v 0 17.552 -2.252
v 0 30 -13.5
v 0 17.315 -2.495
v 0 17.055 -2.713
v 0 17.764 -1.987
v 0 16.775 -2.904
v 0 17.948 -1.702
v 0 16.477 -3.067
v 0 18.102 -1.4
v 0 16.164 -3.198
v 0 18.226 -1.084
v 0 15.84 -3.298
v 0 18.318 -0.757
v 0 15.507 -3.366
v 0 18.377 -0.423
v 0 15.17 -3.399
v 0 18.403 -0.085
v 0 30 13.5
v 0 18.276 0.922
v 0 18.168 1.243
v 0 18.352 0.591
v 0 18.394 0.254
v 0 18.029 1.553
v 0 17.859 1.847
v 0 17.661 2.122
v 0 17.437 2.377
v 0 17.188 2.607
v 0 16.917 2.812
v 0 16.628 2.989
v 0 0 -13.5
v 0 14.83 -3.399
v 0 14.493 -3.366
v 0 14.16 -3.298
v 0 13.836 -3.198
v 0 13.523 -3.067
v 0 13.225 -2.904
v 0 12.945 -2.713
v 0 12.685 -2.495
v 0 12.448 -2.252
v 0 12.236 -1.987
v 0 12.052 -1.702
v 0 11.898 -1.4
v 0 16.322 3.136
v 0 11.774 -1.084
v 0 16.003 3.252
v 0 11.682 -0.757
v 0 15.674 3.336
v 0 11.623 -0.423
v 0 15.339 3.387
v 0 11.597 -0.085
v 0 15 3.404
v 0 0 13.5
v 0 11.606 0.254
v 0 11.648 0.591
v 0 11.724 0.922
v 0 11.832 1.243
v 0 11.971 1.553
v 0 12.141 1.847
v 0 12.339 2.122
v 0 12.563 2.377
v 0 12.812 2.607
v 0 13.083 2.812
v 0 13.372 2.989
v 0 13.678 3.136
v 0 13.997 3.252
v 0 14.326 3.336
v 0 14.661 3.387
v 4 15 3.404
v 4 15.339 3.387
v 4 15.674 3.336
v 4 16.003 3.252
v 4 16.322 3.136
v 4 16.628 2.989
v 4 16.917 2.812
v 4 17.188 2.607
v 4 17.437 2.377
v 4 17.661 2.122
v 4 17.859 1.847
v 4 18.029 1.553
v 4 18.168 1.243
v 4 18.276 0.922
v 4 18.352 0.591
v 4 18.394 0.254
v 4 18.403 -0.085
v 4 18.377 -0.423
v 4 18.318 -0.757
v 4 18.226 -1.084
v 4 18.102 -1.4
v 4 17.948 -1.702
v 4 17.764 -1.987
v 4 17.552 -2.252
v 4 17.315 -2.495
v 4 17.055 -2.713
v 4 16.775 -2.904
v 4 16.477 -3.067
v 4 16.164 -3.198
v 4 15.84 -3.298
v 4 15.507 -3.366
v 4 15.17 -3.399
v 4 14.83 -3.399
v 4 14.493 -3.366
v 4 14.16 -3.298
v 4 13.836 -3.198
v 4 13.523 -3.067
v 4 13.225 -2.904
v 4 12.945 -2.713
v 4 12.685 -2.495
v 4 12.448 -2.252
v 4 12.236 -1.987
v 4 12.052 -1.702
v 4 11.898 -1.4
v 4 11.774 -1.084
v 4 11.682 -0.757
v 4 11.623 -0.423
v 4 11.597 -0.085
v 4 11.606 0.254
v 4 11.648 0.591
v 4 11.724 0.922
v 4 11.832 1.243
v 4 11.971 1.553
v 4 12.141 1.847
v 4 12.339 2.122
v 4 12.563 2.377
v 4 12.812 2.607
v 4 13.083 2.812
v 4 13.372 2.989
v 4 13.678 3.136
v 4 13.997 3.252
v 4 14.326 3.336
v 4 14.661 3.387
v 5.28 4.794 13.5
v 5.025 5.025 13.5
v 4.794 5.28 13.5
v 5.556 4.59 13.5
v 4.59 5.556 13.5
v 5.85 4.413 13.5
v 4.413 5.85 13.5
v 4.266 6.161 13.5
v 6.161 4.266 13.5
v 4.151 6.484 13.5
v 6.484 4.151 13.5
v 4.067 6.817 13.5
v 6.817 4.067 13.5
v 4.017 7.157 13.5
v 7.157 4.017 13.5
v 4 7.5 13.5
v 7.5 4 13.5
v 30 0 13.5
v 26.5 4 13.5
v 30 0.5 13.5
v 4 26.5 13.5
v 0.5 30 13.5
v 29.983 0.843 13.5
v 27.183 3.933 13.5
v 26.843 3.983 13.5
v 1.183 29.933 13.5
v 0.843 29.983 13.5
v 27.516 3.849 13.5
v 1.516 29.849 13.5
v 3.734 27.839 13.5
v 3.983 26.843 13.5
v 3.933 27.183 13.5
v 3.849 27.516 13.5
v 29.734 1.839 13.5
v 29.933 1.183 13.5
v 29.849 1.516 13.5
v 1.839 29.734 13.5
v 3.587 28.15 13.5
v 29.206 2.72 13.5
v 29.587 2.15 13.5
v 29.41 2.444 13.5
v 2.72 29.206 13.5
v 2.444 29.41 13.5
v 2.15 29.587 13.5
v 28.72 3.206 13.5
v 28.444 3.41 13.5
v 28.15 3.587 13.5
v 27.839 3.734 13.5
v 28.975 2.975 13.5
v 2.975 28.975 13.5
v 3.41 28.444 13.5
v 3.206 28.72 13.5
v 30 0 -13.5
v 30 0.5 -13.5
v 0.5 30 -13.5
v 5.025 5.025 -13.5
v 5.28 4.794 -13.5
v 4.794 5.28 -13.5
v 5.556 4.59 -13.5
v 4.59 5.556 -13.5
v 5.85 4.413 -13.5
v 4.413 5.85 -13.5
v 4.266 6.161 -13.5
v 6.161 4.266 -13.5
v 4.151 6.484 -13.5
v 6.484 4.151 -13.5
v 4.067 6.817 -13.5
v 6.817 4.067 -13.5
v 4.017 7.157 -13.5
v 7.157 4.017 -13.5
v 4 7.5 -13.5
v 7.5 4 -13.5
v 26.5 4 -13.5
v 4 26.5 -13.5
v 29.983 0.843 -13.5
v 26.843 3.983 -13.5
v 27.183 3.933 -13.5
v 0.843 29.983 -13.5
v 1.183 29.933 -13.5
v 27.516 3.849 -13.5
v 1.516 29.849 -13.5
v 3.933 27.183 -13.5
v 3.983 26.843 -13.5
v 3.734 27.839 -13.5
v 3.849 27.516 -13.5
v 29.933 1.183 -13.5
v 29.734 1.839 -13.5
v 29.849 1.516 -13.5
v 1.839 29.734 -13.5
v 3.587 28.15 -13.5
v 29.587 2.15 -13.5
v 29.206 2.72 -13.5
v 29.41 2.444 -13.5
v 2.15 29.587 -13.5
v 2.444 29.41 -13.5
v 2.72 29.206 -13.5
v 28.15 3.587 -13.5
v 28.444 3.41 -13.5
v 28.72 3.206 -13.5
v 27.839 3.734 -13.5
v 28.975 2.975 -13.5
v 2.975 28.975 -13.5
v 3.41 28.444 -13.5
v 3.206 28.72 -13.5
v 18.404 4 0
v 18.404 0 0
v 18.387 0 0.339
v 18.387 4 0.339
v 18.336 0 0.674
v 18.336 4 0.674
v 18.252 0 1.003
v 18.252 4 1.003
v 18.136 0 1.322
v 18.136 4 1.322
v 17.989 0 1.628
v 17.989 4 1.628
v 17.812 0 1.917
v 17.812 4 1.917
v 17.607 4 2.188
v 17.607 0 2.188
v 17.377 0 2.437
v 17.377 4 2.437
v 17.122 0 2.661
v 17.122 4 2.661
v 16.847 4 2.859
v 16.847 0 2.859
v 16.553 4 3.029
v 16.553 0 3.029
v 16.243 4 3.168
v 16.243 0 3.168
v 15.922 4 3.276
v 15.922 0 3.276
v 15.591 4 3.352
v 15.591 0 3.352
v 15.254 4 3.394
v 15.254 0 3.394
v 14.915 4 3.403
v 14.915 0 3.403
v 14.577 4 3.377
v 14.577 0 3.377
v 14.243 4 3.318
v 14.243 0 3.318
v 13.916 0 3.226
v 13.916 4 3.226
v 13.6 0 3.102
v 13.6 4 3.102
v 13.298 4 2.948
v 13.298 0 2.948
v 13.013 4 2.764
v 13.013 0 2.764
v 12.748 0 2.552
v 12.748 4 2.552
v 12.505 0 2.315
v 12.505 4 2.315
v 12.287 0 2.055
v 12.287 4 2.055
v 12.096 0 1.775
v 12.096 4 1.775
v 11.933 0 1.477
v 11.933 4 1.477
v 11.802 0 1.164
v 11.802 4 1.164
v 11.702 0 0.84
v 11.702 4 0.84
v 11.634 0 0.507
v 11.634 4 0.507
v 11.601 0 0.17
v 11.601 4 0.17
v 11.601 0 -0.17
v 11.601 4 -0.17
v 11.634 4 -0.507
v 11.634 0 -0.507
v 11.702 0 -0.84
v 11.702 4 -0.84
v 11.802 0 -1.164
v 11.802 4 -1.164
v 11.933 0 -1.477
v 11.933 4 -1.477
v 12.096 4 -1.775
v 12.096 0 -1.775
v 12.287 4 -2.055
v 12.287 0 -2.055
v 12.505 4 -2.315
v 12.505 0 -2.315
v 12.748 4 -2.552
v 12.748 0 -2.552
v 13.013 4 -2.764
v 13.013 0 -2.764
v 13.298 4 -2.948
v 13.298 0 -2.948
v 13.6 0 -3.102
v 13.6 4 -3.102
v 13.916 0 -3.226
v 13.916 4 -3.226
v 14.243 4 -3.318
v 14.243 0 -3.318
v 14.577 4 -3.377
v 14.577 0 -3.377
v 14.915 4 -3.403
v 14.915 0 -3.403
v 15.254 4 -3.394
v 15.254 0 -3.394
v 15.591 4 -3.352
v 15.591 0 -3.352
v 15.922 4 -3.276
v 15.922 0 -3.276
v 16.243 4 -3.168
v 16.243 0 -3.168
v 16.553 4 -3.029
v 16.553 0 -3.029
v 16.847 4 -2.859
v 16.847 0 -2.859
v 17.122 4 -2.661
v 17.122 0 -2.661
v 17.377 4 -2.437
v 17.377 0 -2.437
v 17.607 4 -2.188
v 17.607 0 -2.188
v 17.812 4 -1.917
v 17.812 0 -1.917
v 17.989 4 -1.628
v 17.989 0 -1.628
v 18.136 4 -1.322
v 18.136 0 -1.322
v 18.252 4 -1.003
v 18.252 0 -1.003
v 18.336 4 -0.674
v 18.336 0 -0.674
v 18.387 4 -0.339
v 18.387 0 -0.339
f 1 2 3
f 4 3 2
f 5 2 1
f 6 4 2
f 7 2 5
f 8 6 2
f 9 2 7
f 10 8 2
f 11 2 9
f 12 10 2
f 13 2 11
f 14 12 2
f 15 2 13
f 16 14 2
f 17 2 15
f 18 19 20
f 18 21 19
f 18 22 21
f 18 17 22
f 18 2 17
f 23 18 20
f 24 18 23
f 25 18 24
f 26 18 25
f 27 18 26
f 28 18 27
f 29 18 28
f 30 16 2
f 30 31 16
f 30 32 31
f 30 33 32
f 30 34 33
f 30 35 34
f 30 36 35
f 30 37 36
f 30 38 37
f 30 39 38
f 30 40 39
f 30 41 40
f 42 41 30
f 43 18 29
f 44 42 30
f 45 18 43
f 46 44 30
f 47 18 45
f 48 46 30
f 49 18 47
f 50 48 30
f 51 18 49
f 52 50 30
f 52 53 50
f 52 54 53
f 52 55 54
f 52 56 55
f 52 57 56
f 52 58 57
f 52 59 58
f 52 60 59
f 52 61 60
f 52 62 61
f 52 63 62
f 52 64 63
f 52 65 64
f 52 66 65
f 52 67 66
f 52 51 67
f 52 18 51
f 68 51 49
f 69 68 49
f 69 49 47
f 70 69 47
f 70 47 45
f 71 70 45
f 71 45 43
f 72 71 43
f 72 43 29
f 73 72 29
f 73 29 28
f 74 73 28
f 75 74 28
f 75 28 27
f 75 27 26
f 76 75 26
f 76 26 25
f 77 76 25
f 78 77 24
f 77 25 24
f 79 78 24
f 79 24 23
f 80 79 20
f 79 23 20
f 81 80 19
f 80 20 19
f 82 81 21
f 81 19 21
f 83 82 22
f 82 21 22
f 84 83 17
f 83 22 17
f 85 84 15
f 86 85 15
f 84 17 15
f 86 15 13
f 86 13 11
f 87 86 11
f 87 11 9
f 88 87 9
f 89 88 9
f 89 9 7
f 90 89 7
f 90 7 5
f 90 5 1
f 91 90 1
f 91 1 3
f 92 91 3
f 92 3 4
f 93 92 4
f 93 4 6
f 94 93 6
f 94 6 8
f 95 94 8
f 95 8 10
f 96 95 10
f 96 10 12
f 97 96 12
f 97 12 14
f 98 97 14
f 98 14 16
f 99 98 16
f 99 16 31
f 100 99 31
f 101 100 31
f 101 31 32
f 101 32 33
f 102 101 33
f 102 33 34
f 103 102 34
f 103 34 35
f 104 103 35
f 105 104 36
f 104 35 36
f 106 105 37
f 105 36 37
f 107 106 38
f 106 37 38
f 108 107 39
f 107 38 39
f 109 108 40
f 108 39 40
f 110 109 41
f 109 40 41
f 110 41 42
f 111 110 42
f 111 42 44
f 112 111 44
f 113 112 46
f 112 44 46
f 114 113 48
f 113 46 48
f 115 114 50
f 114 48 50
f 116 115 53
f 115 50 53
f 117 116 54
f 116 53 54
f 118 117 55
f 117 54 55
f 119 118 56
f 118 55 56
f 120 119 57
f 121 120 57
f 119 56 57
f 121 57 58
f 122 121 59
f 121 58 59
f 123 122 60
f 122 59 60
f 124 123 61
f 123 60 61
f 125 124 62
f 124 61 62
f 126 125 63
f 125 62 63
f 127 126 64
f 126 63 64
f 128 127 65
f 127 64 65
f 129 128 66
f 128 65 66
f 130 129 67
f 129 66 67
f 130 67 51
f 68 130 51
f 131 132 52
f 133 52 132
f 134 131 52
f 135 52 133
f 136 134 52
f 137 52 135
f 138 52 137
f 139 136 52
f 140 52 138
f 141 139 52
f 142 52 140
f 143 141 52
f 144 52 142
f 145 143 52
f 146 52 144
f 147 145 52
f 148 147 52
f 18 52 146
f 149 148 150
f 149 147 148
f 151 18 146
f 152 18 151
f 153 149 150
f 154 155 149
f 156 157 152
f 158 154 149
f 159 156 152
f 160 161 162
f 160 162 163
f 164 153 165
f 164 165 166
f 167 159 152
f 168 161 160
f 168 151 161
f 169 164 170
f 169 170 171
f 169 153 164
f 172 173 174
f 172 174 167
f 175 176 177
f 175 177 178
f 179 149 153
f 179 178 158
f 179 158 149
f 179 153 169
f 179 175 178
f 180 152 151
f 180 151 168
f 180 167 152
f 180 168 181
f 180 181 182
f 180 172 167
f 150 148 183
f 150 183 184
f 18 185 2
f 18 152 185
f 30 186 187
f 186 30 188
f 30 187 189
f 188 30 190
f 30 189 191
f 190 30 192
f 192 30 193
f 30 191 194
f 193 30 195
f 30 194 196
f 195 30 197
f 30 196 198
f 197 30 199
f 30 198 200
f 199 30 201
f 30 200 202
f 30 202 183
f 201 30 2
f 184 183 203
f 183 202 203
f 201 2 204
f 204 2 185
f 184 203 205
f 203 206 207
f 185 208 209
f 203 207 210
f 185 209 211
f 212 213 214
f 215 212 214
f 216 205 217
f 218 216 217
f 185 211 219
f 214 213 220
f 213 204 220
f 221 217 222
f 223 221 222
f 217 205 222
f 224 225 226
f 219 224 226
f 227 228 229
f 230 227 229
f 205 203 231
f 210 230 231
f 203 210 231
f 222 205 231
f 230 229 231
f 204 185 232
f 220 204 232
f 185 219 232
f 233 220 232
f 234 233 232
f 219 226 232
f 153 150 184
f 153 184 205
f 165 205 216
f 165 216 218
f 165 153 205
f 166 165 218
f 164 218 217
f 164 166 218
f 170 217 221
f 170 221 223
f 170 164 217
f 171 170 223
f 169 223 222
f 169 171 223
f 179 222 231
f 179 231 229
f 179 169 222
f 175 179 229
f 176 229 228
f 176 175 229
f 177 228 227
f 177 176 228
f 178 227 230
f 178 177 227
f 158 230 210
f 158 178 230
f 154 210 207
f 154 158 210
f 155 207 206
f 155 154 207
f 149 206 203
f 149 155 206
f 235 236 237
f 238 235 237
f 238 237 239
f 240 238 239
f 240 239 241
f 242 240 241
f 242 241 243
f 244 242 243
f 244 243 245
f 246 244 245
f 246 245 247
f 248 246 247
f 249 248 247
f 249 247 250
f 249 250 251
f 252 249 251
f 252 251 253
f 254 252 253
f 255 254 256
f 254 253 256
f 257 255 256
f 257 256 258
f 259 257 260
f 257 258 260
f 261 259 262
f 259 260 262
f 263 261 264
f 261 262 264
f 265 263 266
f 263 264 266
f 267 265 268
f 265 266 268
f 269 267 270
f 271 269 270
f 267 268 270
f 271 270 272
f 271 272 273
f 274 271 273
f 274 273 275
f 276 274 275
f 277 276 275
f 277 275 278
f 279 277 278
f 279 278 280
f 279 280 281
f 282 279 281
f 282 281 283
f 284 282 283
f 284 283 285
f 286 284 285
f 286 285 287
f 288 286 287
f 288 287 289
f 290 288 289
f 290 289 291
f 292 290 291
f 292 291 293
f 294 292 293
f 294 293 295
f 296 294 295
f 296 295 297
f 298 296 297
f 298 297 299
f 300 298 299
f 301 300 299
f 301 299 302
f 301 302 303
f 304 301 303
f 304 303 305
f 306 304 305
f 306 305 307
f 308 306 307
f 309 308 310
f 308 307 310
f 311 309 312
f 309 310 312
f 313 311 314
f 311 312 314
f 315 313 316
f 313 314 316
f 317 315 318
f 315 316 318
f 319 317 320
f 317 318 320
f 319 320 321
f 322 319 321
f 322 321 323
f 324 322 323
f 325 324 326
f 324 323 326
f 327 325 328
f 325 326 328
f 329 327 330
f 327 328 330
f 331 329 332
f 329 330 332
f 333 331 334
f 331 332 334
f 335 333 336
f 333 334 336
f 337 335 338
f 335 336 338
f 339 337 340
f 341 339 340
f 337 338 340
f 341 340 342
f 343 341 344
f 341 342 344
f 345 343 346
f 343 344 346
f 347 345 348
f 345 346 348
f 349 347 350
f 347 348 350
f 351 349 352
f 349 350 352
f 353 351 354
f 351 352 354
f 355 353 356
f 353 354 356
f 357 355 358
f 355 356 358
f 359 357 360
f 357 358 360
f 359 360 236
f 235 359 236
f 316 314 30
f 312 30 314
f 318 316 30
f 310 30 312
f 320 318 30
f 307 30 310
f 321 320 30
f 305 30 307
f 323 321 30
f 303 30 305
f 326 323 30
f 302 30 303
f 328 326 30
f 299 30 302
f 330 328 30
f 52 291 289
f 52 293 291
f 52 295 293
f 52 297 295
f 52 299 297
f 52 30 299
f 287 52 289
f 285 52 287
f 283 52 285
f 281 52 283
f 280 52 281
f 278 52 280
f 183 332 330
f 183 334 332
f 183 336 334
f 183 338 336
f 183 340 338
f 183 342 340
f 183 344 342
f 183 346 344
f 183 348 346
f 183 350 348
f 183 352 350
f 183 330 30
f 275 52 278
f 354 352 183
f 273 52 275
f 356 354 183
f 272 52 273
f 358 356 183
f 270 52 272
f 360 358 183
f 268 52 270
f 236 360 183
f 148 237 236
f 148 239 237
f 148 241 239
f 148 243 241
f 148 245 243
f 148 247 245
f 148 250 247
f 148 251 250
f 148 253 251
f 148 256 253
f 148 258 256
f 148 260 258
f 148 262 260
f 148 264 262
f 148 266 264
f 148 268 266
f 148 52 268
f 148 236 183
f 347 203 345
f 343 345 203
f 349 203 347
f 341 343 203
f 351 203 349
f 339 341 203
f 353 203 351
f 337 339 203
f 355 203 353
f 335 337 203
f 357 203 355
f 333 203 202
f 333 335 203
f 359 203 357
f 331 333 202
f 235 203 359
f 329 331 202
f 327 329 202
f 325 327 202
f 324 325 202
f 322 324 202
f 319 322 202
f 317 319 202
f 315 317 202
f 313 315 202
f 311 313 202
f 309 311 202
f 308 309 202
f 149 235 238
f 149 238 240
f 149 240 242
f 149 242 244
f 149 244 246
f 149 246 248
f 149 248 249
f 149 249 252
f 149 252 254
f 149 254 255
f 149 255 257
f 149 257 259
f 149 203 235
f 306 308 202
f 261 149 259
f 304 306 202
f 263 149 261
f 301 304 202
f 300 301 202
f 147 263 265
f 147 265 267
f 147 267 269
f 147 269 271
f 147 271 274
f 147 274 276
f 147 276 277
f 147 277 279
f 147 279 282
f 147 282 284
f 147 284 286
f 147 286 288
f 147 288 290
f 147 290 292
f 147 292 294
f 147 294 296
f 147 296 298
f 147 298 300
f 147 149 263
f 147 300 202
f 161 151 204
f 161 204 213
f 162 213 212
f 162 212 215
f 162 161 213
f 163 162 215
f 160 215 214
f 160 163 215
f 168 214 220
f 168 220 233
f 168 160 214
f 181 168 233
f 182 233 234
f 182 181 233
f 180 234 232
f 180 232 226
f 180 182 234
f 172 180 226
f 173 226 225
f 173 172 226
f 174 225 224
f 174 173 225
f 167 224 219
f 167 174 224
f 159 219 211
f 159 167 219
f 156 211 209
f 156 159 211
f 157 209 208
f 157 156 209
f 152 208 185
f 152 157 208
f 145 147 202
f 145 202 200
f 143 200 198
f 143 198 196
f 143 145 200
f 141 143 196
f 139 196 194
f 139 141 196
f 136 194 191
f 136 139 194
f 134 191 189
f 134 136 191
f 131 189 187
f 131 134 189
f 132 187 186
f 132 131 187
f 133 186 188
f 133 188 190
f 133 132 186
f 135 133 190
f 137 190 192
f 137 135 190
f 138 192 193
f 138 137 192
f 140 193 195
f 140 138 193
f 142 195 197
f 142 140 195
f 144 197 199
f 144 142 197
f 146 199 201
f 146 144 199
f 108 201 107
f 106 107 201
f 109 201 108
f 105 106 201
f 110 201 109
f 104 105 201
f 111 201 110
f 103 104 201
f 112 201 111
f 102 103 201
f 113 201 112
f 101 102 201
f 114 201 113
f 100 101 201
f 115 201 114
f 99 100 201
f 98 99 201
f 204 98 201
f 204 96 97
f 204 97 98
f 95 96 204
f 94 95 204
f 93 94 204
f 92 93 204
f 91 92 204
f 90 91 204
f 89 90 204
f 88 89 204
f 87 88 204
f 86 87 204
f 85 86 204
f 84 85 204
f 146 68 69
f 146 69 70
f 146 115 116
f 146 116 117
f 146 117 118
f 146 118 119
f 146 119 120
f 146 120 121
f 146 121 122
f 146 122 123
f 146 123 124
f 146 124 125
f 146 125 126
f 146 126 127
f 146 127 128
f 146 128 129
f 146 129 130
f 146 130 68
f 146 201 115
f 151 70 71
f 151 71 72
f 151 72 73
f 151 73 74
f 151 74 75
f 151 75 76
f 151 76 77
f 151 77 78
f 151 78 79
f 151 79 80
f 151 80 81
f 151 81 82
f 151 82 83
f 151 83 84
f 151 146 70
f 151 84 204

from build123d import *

# Parameters (mm, degrees)
BOSS_EXTRUDE1_DEPTH = 13.5
SKETCH4_R           = 3.4036
CUT_EXTRUDE3_DEPTH  = 10
SKETCH5_R           = 3.4036
CUT_EXTRUDE4_DEPTH  = 10


with BuildPart() as part:
    # Sketch1 → Boss-Extrude1 (new body, symmetric)
    with BuildSketch(Plane.XY):
        with BuildLine():
            Line((0, 0), (30, 0))
            Line((30, 0), (30, 0.5))
            ThreePointArc((30, 0.5), (28.974873734, 2.974873734), (26.5, 4))
            Line((26.5, 4), (7.5, 4))
            ThreePointArc((7.5, 4), (5.025126266, 5.025126266), (4, 7.5))
            Line((4, 7.5), (4, 26.5))
            ThreePointArc((4, 26.5), (2.974873734, 28.974873734), (0.5, 30))
            Line((0.5, 30), (0, 30))
            Line((0, 30), (0, 0))
        make_face()
    extrude(amount=BOSS_EXTRUDE1_DEPTH, both=True)

    # Sketch4 → Cut-Extrude3 (cut)
    with BuildSketch(Plane.ZY):
        with Locations((0, 15)):
            Circle(SKETCH4_R)
    extrude(amount=-CUT_EXTRUDE3_DEPTH, mode=Mode.SUBTRACT)

    # Sketch5 → Cut-Extrude4 (cut)
    with BuildSketch(Plane.XZ):
        with Locations((15, 0)):
            Circle(SKETCH5_R)
    extrude(amount=-CUT_EXTRUDE4_DEPTH, mode=Mode.SUBTRACT)


solid = part.part
